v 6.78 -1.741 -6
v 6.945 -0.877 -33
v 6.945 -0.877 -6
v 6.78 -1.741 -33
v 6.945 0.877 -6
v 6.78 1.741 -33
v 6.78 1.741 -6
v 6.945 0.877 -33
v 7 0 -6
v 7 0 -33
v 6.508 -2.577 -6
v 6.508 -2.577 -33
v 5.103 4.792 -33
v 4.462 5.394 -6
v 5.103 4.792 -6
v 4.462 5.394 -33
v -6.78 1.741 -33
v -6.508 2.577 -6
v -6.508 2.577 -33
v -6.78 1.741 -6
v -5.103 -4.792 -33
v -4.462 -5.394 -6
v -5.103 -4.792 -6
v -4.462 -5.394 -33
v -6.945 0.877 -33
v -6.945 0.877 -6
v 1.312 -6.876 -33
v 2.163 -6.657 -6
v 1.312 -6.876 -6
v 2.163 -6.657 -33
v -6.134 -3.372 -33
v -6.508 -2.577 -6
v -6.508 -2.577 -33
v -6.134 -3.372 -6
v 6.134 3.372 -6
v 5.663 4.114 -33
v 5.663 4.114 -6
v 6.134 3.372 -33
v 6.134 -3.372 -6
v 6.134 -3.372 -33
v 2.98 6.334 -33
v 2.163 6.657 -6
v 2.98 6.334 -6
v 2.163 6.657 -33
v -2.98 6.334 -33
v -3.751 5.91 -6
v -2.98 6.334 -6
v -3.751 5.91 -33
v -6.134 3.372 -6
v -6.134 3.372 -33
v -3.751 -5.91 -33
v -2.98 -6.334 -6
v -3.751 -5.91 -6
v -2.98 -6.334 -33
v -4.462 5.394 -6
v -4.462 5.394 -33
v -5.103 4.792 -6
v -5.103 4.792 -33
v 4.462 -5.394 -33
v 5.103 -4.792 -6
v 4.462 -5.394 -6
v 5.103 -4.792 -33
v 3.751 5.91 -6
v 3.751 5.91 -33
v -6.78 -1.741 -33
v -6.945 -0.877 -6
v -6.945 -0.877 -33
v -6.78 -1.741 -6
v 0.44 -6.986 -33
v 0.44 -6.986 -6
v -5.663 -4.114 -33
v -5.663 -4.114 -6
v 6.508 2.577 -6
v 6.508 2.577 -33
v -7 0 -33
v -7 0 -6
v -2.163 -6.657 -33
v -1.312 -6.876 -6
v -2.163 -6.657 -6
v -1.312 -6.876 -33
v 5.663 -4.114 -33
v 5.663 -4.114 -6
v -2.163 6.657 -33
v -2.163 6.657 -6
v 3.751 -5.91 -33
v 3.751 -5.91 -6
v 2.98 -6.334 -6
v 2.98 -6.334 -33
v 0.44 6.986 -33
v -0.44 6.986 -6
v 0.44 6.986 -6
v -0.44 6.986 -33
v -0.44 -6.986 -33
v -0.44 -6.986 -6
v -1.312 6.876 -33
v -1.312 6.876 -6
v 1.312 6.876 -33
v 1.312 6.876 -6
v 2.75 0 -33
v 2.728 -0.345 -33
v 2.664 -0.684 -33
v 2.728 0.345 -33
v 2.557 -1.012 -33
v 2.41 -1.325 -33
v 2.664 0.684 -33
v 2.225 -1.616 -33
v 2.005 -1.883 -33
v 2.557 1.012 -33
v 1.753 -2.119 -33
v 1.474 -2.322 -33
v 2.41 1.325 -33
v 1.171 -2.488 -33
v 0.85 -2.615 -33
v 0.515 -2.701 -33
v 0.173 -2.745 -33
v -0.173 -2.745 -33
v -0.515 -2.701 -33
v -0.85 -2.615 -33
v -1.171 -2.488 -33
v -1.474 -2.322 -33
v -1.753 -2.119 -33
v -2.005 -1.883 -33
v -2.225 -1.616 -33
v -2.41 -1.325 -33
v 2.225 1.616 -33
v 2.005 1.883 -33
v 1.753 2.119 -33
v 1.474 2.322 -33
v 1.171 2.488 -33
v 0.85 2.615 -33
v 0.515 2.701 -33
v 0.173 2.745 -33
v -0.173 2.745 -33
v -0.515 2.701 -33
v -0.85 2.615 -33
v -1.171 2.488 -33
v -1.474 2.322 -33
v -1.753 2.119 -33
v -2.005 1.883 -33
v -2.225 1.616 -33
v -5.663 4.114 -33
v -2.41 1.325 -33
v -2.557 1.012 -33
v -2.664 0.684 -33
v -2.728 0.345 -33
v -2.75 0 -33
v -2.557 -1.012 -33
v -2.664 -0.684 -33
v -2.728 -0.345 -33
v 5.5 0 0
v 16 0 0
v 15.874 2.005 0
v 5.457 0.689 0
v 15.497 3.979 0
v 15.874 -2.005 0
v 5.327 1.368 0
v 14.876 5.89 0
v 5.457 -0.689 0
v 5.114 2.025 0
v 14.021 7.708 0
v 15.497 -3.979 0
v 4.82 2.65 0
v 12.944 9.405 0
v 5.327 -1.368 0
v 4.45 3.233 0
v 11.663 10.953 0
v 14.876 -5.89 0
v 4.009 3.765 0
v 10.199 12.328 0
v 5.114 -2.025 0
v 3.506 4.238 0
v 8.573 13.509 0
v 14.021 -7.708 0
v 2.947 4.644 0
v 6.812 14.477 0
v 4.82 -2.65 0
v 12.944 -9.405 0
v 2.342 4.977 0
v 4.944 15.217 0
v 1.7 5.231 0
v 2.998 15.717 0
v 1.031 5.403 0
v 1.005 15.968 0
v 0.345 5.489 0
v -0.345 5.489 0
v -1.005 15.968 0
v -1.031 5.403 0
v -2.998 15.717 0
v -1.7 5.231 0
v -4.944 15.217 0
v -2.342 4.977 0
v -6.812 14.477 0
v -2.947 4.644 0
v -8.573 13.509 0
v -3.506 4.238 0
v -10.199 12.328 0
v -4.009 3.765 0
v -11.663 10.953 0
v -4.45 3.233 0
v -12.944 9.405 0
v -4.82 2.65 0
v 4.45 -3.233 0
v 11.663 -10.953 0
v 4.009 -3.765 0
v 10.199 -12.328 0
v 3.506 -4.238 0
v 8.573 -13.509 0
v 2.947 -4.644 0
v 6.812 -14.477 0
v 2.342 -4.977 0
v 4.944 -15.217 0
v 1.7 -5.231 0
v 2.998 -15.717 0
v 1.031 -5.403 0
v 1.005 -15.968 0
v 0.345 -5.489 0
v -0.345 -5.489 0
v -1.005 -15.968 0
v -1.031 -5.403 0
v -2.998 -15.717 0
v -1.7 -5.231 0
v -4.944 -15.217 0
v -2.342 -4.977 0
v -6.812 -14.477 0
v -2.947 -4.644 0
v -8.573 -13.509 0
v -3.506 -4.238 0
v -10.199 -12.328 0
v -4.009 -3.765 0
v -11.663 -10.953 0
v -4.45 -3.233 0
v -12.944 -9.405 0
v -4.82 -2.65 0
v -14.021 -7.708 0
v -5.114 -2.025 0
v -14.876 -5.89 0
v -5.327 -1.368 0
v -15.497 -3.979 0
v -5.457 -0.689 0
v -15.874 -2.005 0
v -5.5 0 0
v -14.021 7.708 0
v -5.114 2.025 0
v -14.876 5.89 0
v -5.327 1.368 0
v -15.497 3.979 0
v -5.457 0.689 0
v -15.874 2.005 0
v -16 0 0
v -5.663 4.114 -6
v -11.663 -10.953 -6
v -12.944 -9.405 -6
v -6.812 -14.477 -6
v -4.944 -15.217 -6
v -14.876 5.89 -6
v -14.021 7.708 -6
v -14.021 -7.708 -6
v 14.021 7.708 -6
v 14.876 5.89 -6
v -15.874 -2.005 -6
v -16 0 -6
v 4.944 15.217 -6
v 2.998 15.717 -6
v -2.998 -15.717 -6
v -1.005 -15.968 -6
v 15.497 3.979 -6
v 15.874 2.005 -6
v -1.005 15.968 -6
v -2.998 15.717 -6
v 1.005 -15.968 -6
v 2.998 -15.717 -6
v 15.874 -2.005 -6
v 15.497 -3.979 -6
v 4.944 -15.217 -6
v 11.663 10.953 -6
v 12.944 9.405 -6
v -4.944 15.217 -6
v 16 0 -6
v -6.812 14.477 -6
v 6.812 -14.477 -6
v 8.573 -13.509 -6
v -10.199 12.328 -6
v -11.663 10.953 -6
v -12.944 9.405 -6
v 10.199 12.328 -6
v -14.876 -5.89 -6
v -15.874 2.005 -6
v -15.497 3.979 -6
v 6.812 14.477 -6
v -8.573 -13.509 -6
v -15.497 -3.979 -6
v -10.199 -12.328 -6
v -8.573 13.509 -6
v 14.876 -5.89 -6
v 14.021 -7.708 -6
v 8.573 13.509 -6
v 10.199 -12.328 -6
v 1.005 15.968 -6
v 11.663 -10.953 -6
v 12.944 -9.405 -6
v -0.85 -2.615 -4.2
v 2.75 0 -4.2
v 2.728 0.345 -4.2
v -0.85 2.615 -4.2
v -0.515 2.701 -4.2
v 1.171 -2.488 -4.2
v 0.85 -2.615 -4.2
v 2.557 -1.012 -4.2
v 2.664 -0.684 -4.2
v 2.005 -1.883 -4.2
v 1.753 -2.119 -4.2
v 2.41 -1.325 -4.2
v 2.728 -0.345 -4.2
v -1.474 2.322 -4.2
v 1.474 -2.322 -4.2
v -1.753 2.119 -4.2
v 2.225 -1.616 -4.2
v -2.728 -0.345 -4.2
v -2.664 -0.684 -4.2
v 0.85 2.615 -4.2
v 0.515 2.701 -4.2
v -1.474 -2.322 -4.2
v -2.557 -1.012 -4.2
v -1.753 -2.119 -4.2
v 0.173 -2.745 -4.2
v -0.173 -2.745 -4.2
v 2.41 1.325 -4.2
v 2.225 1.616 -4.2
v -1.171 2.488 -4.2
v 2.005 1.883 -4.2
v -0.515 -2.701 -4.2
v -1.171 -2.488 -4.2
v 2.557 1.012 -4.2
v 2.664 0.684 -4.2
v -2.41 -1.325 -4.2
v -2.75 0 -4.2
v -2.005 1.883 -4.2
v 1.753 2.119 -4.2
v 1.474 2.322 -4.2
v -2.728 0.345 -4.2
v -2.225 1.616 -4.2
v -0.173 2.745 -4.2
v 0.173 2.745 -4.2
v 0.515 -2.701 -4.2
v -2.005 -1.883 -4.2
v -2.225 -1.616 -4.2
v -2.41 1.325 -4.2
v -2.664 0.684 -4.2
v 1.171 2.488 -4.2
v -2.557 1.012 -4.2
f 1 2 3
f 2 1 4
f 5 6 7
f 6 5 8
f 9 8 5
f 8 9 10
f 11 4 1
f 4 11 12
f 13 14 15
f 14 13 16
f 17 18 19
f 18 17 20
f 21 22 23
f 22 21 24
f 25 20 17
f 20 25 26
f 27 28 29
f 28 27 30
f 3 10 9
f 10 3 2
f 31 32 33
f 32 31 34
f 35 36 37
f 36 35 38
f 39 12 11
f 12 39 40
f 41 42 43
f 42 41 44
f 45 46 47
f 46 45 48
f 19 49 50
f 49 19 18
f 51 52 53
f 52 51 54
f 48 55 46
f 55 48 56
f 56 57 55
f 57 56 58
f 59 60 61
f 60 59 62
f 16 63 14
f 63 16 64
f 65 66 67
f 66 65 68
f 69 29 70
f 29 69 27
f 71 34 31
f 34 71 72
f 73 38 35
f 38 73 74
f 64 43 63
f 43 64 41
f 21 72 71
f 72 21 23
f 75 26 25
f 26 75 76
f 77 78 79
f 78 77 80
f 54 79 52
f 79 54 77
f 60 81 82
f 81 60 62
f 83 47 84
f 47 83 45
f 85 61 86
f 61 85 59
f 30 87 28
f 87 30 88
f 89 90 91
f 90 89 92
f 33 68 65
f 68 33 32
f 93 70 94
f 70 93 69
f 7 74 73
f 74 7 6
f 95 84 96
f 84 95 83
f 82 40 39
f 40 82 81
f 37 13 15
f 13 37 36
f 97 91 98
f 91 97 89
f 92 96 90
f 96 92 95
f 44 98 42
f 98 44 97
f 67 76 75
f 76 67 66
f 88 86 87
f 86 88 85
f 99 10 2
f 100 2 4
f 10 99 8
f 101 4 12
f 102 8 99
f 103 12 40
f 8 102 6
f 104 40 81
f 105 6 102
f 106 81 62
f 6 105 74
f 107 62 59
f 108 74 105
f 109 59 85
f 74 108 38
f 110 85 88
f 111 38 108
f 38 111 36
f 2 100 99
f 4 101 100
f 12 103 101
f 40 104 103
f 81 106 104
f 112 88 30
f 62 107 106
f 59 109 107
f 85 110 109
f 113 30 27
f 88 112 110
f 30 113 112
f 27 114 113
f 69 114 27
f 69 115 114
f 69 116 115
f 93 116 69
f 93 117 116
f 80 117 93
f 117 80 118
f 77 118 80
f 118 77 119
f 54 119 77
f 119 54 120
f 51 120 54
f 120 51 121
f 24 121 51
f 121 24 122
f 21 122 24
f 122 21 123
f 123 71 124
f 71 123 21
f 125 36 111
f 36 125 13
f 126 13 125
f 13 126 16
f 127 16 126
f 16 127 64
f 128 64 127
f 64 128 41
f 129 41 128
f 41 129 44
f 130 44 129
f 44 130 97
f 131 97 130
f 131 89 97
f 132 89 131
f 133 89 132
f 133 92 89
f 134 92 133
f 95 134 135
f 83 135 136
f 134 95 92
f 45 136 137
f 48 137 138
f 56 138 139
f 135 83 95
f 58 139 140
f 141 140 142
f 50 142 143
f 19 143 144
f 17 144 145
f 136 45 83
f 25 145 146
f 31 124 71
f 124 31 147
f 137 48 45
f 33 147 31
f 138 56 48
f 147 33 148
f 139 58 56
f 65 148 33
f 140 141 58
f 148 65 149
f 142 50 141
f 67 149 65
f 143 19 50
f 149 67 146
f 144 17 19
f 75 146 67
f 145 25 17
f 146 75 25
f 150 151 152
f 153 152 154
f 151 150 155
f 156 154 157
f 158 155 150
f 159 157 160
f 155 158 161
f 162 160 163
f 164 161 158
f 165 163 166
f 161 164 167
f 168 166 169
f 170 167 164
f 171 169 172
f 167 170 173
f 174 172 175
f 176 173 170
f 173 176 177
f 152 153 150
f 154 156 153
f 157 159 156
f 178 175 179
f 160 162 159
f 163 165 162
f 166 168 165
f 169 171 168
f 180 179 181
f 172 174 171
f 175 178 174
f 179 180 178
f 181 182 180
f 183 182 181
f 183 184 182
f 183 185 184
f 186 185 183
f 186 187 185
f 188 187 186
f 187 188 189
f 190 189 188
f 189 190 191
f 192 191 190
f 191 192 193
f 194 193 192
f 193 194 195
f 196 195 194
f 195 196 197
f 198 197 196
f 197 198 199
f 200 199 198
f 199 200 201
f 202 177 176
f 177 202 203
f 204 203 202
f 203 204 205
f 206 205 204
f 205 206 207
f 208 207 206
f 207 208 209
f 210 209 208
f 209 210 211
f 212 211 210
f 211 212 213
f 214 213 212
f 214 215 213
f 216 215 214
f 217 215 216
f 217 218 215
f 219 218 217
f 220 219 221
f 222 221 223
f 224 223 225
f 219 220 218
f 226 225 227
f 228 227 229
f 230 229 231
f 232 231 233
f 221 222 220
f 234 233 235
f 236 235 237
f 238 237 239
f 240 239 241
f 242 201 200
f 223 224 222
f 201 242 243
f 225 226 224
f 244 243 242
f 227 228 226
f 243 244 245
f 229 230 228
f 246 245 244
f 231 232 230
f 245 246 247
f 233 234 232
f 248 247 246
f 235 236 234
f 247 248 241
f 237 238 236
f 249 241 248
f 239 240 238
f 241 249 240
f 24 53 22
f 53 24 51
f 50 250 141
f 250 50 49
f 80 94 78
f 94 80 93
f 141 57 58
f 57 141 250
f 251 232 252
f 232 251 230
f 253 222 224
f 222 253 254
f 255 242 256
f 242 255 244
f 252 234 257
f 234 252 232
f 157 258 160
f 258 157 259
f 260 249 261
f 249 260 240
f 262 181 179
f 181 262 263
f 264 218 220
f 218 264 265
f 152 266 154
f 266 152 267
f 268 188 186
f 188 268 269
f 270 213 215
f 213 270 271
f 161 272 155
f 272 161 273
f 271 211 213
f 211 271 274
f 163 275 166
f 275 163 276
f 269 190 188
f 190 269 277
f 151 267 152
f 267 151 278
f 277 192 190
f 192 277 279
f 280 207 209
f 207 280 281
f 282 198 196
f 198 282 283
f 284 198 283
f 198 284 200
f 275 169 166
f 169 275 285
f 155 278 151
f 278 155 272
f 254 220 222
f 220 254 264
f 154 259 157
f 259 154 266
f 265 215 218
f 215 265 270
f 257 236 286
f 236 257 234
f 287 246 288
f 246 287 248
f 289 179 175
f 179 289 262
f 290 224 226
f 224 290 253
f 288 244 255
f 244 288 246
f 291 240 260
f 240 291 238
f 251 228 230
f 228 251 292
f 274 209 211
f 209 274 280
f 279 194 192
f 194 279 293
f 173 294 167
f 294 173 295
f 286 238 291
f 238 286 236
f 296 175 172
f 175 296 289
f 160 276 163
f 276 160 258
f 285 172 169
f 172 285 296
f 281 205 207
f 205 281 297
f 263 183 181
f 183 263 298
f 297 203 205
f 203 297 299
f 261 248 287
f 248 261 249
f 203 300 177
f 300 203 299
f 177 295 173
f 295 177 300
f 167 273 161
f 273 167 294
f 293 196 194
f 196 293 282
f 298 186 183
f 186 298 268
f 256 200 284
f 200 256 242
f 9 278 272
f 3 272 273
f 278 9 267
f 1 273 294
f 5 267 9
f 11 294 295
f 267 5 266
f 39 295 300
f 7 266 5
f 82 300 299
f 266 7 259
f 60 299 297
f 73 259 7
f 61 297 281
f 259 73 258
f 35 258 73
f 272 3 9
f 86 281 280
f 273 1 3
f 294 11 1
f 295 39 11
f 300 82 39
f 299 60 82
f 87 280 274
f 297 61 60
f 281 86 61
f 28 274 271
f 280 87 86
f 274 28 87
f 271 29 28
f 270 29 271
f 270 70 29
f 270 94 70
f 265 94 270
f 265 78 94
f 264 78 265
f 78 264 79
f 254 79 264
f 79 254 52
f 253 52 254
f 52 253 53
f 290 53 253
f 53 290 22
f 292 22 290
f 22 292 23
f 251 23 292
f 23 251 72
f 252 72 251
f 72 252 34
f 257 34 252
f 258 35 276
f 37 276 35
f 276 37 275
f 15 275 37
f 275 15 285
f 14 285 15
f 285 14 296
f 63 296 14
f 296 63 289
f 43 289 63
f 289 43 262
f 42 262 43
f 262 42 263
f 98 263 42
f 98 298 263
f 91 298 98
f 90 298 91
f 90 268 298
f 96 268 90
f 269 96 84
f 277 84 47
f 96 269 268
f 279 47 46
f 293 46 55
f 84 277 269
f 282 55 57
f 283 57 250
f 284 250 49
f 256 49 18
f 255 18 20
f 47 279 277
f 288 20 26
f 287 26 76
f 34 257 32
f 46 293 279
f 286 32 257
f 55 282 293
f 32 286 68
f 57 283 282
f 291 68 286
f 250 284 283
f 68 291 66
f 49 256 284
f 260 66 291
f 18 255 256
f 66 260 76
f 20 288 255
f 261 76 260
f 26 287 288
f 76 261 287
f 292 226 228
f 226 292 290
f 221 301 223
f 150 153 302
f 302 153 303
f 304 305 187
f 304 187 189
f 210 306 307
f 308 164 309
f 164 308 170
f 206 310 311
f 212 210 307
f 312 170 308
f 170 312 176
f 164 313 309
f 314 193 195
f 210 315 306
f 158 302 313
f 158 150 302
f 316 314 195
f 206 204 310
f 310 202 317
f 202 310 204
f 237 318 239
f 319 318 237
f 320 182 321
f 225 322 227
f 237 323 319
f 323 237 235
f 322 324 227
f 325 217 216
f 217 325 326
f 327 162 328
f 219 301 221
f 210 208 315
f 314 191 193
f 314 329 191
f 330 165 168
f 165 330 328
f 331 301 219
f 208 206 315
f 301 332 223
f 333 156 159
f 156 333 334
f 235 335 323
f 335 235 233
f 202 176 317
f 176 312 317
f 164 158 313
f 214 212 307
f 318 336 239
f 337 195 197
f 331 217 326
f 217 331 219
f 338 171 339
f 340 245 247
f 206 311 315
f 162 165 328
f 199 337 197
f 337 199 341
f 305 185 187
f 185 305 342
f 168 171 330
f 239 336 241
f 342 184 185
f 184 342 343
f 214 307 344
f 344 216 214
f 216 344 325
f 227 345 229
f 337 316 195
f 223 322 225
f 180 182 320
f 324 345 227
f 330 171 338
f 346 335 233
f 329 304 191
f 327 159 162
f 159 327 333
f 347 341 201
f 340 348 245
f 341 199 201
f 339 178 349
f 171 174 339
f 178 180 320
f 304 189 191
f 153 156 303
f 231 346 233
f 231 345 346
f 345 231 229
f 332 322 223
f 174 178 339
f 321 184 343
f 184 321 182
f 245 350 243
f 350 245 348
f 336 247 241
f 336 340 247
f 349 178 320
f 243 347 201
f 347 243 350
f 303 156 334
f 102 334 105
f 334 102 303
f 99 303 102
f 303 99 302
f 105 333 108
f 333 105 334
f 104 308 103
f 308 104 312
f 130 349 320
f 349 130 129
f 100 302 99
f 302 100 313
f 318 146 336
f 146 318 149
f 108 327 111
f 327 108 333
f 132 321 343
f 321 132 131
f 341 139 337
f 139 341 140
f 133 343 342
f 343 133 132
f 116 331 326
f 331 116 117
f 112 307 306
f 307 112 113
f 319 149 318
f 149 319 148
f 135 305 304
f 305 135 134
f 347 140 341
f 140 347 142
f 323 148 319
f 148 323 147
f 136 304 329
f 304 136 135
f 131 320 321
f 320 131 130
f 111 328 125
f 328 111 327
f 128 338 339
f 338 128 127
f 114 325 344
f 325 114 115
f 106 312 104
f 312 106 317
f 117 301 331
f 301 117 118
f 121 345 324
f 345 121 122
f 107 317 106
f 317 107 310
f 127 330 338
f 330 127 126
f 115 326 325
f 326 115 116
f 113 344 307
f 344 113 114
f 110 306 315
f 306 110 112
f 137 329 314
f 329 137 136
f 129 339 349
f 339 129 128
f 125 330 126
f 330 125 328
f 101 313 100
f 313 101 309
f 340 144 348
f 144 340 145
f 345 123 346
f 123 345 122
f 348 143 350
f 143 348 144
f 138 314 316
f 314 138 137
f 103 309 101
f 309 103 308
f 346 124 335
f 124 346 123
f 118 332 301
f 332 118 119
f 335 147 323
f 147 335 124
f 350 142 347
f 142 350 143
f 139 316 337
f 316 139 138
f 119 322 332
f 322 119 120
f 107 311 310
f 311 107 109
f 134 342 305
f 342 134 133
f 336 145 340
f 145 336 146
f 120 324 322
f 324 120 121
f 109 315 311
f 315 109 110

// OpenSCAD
$fn = 50;


difference() {
	union() {
		translate(v = [0, 0, -33.0000000000]) {
			cylinder(h = 33, r = 7.0000000000);
		}
		translate(v = [0, 0, -6.0000000000]) {
			cylinder(h = 6, r = 16.0000000000);
		}
	}
	union() {
		translate(v = [0, 0, 0]) {
			rotate(a = [0, 0, 0]) {
				difference() {
					union() {
						#translate(v = [0, 0, -33.0000000000]) {
							cylinder(h = 33, r = 2.2500000000);
						}
						#translate(v = [0, 0, -4.2000000000]) {
							cylinder(h = 4.2000000000, r = 7.0000000000, r1 = 2.7500000000, r2 = 5.5000000000);
						}
						#translate(v = [0, 0, -33.0000000000]) {
							cylinder(h = 33, r = 2.7500000000);
						}
						#translate(v = [0, 0, -33.0000000000]) {
							cylinder(h = 33, r = 2.2500000000);
						}
					}
					union();
				}
			}
		}
	}
}
